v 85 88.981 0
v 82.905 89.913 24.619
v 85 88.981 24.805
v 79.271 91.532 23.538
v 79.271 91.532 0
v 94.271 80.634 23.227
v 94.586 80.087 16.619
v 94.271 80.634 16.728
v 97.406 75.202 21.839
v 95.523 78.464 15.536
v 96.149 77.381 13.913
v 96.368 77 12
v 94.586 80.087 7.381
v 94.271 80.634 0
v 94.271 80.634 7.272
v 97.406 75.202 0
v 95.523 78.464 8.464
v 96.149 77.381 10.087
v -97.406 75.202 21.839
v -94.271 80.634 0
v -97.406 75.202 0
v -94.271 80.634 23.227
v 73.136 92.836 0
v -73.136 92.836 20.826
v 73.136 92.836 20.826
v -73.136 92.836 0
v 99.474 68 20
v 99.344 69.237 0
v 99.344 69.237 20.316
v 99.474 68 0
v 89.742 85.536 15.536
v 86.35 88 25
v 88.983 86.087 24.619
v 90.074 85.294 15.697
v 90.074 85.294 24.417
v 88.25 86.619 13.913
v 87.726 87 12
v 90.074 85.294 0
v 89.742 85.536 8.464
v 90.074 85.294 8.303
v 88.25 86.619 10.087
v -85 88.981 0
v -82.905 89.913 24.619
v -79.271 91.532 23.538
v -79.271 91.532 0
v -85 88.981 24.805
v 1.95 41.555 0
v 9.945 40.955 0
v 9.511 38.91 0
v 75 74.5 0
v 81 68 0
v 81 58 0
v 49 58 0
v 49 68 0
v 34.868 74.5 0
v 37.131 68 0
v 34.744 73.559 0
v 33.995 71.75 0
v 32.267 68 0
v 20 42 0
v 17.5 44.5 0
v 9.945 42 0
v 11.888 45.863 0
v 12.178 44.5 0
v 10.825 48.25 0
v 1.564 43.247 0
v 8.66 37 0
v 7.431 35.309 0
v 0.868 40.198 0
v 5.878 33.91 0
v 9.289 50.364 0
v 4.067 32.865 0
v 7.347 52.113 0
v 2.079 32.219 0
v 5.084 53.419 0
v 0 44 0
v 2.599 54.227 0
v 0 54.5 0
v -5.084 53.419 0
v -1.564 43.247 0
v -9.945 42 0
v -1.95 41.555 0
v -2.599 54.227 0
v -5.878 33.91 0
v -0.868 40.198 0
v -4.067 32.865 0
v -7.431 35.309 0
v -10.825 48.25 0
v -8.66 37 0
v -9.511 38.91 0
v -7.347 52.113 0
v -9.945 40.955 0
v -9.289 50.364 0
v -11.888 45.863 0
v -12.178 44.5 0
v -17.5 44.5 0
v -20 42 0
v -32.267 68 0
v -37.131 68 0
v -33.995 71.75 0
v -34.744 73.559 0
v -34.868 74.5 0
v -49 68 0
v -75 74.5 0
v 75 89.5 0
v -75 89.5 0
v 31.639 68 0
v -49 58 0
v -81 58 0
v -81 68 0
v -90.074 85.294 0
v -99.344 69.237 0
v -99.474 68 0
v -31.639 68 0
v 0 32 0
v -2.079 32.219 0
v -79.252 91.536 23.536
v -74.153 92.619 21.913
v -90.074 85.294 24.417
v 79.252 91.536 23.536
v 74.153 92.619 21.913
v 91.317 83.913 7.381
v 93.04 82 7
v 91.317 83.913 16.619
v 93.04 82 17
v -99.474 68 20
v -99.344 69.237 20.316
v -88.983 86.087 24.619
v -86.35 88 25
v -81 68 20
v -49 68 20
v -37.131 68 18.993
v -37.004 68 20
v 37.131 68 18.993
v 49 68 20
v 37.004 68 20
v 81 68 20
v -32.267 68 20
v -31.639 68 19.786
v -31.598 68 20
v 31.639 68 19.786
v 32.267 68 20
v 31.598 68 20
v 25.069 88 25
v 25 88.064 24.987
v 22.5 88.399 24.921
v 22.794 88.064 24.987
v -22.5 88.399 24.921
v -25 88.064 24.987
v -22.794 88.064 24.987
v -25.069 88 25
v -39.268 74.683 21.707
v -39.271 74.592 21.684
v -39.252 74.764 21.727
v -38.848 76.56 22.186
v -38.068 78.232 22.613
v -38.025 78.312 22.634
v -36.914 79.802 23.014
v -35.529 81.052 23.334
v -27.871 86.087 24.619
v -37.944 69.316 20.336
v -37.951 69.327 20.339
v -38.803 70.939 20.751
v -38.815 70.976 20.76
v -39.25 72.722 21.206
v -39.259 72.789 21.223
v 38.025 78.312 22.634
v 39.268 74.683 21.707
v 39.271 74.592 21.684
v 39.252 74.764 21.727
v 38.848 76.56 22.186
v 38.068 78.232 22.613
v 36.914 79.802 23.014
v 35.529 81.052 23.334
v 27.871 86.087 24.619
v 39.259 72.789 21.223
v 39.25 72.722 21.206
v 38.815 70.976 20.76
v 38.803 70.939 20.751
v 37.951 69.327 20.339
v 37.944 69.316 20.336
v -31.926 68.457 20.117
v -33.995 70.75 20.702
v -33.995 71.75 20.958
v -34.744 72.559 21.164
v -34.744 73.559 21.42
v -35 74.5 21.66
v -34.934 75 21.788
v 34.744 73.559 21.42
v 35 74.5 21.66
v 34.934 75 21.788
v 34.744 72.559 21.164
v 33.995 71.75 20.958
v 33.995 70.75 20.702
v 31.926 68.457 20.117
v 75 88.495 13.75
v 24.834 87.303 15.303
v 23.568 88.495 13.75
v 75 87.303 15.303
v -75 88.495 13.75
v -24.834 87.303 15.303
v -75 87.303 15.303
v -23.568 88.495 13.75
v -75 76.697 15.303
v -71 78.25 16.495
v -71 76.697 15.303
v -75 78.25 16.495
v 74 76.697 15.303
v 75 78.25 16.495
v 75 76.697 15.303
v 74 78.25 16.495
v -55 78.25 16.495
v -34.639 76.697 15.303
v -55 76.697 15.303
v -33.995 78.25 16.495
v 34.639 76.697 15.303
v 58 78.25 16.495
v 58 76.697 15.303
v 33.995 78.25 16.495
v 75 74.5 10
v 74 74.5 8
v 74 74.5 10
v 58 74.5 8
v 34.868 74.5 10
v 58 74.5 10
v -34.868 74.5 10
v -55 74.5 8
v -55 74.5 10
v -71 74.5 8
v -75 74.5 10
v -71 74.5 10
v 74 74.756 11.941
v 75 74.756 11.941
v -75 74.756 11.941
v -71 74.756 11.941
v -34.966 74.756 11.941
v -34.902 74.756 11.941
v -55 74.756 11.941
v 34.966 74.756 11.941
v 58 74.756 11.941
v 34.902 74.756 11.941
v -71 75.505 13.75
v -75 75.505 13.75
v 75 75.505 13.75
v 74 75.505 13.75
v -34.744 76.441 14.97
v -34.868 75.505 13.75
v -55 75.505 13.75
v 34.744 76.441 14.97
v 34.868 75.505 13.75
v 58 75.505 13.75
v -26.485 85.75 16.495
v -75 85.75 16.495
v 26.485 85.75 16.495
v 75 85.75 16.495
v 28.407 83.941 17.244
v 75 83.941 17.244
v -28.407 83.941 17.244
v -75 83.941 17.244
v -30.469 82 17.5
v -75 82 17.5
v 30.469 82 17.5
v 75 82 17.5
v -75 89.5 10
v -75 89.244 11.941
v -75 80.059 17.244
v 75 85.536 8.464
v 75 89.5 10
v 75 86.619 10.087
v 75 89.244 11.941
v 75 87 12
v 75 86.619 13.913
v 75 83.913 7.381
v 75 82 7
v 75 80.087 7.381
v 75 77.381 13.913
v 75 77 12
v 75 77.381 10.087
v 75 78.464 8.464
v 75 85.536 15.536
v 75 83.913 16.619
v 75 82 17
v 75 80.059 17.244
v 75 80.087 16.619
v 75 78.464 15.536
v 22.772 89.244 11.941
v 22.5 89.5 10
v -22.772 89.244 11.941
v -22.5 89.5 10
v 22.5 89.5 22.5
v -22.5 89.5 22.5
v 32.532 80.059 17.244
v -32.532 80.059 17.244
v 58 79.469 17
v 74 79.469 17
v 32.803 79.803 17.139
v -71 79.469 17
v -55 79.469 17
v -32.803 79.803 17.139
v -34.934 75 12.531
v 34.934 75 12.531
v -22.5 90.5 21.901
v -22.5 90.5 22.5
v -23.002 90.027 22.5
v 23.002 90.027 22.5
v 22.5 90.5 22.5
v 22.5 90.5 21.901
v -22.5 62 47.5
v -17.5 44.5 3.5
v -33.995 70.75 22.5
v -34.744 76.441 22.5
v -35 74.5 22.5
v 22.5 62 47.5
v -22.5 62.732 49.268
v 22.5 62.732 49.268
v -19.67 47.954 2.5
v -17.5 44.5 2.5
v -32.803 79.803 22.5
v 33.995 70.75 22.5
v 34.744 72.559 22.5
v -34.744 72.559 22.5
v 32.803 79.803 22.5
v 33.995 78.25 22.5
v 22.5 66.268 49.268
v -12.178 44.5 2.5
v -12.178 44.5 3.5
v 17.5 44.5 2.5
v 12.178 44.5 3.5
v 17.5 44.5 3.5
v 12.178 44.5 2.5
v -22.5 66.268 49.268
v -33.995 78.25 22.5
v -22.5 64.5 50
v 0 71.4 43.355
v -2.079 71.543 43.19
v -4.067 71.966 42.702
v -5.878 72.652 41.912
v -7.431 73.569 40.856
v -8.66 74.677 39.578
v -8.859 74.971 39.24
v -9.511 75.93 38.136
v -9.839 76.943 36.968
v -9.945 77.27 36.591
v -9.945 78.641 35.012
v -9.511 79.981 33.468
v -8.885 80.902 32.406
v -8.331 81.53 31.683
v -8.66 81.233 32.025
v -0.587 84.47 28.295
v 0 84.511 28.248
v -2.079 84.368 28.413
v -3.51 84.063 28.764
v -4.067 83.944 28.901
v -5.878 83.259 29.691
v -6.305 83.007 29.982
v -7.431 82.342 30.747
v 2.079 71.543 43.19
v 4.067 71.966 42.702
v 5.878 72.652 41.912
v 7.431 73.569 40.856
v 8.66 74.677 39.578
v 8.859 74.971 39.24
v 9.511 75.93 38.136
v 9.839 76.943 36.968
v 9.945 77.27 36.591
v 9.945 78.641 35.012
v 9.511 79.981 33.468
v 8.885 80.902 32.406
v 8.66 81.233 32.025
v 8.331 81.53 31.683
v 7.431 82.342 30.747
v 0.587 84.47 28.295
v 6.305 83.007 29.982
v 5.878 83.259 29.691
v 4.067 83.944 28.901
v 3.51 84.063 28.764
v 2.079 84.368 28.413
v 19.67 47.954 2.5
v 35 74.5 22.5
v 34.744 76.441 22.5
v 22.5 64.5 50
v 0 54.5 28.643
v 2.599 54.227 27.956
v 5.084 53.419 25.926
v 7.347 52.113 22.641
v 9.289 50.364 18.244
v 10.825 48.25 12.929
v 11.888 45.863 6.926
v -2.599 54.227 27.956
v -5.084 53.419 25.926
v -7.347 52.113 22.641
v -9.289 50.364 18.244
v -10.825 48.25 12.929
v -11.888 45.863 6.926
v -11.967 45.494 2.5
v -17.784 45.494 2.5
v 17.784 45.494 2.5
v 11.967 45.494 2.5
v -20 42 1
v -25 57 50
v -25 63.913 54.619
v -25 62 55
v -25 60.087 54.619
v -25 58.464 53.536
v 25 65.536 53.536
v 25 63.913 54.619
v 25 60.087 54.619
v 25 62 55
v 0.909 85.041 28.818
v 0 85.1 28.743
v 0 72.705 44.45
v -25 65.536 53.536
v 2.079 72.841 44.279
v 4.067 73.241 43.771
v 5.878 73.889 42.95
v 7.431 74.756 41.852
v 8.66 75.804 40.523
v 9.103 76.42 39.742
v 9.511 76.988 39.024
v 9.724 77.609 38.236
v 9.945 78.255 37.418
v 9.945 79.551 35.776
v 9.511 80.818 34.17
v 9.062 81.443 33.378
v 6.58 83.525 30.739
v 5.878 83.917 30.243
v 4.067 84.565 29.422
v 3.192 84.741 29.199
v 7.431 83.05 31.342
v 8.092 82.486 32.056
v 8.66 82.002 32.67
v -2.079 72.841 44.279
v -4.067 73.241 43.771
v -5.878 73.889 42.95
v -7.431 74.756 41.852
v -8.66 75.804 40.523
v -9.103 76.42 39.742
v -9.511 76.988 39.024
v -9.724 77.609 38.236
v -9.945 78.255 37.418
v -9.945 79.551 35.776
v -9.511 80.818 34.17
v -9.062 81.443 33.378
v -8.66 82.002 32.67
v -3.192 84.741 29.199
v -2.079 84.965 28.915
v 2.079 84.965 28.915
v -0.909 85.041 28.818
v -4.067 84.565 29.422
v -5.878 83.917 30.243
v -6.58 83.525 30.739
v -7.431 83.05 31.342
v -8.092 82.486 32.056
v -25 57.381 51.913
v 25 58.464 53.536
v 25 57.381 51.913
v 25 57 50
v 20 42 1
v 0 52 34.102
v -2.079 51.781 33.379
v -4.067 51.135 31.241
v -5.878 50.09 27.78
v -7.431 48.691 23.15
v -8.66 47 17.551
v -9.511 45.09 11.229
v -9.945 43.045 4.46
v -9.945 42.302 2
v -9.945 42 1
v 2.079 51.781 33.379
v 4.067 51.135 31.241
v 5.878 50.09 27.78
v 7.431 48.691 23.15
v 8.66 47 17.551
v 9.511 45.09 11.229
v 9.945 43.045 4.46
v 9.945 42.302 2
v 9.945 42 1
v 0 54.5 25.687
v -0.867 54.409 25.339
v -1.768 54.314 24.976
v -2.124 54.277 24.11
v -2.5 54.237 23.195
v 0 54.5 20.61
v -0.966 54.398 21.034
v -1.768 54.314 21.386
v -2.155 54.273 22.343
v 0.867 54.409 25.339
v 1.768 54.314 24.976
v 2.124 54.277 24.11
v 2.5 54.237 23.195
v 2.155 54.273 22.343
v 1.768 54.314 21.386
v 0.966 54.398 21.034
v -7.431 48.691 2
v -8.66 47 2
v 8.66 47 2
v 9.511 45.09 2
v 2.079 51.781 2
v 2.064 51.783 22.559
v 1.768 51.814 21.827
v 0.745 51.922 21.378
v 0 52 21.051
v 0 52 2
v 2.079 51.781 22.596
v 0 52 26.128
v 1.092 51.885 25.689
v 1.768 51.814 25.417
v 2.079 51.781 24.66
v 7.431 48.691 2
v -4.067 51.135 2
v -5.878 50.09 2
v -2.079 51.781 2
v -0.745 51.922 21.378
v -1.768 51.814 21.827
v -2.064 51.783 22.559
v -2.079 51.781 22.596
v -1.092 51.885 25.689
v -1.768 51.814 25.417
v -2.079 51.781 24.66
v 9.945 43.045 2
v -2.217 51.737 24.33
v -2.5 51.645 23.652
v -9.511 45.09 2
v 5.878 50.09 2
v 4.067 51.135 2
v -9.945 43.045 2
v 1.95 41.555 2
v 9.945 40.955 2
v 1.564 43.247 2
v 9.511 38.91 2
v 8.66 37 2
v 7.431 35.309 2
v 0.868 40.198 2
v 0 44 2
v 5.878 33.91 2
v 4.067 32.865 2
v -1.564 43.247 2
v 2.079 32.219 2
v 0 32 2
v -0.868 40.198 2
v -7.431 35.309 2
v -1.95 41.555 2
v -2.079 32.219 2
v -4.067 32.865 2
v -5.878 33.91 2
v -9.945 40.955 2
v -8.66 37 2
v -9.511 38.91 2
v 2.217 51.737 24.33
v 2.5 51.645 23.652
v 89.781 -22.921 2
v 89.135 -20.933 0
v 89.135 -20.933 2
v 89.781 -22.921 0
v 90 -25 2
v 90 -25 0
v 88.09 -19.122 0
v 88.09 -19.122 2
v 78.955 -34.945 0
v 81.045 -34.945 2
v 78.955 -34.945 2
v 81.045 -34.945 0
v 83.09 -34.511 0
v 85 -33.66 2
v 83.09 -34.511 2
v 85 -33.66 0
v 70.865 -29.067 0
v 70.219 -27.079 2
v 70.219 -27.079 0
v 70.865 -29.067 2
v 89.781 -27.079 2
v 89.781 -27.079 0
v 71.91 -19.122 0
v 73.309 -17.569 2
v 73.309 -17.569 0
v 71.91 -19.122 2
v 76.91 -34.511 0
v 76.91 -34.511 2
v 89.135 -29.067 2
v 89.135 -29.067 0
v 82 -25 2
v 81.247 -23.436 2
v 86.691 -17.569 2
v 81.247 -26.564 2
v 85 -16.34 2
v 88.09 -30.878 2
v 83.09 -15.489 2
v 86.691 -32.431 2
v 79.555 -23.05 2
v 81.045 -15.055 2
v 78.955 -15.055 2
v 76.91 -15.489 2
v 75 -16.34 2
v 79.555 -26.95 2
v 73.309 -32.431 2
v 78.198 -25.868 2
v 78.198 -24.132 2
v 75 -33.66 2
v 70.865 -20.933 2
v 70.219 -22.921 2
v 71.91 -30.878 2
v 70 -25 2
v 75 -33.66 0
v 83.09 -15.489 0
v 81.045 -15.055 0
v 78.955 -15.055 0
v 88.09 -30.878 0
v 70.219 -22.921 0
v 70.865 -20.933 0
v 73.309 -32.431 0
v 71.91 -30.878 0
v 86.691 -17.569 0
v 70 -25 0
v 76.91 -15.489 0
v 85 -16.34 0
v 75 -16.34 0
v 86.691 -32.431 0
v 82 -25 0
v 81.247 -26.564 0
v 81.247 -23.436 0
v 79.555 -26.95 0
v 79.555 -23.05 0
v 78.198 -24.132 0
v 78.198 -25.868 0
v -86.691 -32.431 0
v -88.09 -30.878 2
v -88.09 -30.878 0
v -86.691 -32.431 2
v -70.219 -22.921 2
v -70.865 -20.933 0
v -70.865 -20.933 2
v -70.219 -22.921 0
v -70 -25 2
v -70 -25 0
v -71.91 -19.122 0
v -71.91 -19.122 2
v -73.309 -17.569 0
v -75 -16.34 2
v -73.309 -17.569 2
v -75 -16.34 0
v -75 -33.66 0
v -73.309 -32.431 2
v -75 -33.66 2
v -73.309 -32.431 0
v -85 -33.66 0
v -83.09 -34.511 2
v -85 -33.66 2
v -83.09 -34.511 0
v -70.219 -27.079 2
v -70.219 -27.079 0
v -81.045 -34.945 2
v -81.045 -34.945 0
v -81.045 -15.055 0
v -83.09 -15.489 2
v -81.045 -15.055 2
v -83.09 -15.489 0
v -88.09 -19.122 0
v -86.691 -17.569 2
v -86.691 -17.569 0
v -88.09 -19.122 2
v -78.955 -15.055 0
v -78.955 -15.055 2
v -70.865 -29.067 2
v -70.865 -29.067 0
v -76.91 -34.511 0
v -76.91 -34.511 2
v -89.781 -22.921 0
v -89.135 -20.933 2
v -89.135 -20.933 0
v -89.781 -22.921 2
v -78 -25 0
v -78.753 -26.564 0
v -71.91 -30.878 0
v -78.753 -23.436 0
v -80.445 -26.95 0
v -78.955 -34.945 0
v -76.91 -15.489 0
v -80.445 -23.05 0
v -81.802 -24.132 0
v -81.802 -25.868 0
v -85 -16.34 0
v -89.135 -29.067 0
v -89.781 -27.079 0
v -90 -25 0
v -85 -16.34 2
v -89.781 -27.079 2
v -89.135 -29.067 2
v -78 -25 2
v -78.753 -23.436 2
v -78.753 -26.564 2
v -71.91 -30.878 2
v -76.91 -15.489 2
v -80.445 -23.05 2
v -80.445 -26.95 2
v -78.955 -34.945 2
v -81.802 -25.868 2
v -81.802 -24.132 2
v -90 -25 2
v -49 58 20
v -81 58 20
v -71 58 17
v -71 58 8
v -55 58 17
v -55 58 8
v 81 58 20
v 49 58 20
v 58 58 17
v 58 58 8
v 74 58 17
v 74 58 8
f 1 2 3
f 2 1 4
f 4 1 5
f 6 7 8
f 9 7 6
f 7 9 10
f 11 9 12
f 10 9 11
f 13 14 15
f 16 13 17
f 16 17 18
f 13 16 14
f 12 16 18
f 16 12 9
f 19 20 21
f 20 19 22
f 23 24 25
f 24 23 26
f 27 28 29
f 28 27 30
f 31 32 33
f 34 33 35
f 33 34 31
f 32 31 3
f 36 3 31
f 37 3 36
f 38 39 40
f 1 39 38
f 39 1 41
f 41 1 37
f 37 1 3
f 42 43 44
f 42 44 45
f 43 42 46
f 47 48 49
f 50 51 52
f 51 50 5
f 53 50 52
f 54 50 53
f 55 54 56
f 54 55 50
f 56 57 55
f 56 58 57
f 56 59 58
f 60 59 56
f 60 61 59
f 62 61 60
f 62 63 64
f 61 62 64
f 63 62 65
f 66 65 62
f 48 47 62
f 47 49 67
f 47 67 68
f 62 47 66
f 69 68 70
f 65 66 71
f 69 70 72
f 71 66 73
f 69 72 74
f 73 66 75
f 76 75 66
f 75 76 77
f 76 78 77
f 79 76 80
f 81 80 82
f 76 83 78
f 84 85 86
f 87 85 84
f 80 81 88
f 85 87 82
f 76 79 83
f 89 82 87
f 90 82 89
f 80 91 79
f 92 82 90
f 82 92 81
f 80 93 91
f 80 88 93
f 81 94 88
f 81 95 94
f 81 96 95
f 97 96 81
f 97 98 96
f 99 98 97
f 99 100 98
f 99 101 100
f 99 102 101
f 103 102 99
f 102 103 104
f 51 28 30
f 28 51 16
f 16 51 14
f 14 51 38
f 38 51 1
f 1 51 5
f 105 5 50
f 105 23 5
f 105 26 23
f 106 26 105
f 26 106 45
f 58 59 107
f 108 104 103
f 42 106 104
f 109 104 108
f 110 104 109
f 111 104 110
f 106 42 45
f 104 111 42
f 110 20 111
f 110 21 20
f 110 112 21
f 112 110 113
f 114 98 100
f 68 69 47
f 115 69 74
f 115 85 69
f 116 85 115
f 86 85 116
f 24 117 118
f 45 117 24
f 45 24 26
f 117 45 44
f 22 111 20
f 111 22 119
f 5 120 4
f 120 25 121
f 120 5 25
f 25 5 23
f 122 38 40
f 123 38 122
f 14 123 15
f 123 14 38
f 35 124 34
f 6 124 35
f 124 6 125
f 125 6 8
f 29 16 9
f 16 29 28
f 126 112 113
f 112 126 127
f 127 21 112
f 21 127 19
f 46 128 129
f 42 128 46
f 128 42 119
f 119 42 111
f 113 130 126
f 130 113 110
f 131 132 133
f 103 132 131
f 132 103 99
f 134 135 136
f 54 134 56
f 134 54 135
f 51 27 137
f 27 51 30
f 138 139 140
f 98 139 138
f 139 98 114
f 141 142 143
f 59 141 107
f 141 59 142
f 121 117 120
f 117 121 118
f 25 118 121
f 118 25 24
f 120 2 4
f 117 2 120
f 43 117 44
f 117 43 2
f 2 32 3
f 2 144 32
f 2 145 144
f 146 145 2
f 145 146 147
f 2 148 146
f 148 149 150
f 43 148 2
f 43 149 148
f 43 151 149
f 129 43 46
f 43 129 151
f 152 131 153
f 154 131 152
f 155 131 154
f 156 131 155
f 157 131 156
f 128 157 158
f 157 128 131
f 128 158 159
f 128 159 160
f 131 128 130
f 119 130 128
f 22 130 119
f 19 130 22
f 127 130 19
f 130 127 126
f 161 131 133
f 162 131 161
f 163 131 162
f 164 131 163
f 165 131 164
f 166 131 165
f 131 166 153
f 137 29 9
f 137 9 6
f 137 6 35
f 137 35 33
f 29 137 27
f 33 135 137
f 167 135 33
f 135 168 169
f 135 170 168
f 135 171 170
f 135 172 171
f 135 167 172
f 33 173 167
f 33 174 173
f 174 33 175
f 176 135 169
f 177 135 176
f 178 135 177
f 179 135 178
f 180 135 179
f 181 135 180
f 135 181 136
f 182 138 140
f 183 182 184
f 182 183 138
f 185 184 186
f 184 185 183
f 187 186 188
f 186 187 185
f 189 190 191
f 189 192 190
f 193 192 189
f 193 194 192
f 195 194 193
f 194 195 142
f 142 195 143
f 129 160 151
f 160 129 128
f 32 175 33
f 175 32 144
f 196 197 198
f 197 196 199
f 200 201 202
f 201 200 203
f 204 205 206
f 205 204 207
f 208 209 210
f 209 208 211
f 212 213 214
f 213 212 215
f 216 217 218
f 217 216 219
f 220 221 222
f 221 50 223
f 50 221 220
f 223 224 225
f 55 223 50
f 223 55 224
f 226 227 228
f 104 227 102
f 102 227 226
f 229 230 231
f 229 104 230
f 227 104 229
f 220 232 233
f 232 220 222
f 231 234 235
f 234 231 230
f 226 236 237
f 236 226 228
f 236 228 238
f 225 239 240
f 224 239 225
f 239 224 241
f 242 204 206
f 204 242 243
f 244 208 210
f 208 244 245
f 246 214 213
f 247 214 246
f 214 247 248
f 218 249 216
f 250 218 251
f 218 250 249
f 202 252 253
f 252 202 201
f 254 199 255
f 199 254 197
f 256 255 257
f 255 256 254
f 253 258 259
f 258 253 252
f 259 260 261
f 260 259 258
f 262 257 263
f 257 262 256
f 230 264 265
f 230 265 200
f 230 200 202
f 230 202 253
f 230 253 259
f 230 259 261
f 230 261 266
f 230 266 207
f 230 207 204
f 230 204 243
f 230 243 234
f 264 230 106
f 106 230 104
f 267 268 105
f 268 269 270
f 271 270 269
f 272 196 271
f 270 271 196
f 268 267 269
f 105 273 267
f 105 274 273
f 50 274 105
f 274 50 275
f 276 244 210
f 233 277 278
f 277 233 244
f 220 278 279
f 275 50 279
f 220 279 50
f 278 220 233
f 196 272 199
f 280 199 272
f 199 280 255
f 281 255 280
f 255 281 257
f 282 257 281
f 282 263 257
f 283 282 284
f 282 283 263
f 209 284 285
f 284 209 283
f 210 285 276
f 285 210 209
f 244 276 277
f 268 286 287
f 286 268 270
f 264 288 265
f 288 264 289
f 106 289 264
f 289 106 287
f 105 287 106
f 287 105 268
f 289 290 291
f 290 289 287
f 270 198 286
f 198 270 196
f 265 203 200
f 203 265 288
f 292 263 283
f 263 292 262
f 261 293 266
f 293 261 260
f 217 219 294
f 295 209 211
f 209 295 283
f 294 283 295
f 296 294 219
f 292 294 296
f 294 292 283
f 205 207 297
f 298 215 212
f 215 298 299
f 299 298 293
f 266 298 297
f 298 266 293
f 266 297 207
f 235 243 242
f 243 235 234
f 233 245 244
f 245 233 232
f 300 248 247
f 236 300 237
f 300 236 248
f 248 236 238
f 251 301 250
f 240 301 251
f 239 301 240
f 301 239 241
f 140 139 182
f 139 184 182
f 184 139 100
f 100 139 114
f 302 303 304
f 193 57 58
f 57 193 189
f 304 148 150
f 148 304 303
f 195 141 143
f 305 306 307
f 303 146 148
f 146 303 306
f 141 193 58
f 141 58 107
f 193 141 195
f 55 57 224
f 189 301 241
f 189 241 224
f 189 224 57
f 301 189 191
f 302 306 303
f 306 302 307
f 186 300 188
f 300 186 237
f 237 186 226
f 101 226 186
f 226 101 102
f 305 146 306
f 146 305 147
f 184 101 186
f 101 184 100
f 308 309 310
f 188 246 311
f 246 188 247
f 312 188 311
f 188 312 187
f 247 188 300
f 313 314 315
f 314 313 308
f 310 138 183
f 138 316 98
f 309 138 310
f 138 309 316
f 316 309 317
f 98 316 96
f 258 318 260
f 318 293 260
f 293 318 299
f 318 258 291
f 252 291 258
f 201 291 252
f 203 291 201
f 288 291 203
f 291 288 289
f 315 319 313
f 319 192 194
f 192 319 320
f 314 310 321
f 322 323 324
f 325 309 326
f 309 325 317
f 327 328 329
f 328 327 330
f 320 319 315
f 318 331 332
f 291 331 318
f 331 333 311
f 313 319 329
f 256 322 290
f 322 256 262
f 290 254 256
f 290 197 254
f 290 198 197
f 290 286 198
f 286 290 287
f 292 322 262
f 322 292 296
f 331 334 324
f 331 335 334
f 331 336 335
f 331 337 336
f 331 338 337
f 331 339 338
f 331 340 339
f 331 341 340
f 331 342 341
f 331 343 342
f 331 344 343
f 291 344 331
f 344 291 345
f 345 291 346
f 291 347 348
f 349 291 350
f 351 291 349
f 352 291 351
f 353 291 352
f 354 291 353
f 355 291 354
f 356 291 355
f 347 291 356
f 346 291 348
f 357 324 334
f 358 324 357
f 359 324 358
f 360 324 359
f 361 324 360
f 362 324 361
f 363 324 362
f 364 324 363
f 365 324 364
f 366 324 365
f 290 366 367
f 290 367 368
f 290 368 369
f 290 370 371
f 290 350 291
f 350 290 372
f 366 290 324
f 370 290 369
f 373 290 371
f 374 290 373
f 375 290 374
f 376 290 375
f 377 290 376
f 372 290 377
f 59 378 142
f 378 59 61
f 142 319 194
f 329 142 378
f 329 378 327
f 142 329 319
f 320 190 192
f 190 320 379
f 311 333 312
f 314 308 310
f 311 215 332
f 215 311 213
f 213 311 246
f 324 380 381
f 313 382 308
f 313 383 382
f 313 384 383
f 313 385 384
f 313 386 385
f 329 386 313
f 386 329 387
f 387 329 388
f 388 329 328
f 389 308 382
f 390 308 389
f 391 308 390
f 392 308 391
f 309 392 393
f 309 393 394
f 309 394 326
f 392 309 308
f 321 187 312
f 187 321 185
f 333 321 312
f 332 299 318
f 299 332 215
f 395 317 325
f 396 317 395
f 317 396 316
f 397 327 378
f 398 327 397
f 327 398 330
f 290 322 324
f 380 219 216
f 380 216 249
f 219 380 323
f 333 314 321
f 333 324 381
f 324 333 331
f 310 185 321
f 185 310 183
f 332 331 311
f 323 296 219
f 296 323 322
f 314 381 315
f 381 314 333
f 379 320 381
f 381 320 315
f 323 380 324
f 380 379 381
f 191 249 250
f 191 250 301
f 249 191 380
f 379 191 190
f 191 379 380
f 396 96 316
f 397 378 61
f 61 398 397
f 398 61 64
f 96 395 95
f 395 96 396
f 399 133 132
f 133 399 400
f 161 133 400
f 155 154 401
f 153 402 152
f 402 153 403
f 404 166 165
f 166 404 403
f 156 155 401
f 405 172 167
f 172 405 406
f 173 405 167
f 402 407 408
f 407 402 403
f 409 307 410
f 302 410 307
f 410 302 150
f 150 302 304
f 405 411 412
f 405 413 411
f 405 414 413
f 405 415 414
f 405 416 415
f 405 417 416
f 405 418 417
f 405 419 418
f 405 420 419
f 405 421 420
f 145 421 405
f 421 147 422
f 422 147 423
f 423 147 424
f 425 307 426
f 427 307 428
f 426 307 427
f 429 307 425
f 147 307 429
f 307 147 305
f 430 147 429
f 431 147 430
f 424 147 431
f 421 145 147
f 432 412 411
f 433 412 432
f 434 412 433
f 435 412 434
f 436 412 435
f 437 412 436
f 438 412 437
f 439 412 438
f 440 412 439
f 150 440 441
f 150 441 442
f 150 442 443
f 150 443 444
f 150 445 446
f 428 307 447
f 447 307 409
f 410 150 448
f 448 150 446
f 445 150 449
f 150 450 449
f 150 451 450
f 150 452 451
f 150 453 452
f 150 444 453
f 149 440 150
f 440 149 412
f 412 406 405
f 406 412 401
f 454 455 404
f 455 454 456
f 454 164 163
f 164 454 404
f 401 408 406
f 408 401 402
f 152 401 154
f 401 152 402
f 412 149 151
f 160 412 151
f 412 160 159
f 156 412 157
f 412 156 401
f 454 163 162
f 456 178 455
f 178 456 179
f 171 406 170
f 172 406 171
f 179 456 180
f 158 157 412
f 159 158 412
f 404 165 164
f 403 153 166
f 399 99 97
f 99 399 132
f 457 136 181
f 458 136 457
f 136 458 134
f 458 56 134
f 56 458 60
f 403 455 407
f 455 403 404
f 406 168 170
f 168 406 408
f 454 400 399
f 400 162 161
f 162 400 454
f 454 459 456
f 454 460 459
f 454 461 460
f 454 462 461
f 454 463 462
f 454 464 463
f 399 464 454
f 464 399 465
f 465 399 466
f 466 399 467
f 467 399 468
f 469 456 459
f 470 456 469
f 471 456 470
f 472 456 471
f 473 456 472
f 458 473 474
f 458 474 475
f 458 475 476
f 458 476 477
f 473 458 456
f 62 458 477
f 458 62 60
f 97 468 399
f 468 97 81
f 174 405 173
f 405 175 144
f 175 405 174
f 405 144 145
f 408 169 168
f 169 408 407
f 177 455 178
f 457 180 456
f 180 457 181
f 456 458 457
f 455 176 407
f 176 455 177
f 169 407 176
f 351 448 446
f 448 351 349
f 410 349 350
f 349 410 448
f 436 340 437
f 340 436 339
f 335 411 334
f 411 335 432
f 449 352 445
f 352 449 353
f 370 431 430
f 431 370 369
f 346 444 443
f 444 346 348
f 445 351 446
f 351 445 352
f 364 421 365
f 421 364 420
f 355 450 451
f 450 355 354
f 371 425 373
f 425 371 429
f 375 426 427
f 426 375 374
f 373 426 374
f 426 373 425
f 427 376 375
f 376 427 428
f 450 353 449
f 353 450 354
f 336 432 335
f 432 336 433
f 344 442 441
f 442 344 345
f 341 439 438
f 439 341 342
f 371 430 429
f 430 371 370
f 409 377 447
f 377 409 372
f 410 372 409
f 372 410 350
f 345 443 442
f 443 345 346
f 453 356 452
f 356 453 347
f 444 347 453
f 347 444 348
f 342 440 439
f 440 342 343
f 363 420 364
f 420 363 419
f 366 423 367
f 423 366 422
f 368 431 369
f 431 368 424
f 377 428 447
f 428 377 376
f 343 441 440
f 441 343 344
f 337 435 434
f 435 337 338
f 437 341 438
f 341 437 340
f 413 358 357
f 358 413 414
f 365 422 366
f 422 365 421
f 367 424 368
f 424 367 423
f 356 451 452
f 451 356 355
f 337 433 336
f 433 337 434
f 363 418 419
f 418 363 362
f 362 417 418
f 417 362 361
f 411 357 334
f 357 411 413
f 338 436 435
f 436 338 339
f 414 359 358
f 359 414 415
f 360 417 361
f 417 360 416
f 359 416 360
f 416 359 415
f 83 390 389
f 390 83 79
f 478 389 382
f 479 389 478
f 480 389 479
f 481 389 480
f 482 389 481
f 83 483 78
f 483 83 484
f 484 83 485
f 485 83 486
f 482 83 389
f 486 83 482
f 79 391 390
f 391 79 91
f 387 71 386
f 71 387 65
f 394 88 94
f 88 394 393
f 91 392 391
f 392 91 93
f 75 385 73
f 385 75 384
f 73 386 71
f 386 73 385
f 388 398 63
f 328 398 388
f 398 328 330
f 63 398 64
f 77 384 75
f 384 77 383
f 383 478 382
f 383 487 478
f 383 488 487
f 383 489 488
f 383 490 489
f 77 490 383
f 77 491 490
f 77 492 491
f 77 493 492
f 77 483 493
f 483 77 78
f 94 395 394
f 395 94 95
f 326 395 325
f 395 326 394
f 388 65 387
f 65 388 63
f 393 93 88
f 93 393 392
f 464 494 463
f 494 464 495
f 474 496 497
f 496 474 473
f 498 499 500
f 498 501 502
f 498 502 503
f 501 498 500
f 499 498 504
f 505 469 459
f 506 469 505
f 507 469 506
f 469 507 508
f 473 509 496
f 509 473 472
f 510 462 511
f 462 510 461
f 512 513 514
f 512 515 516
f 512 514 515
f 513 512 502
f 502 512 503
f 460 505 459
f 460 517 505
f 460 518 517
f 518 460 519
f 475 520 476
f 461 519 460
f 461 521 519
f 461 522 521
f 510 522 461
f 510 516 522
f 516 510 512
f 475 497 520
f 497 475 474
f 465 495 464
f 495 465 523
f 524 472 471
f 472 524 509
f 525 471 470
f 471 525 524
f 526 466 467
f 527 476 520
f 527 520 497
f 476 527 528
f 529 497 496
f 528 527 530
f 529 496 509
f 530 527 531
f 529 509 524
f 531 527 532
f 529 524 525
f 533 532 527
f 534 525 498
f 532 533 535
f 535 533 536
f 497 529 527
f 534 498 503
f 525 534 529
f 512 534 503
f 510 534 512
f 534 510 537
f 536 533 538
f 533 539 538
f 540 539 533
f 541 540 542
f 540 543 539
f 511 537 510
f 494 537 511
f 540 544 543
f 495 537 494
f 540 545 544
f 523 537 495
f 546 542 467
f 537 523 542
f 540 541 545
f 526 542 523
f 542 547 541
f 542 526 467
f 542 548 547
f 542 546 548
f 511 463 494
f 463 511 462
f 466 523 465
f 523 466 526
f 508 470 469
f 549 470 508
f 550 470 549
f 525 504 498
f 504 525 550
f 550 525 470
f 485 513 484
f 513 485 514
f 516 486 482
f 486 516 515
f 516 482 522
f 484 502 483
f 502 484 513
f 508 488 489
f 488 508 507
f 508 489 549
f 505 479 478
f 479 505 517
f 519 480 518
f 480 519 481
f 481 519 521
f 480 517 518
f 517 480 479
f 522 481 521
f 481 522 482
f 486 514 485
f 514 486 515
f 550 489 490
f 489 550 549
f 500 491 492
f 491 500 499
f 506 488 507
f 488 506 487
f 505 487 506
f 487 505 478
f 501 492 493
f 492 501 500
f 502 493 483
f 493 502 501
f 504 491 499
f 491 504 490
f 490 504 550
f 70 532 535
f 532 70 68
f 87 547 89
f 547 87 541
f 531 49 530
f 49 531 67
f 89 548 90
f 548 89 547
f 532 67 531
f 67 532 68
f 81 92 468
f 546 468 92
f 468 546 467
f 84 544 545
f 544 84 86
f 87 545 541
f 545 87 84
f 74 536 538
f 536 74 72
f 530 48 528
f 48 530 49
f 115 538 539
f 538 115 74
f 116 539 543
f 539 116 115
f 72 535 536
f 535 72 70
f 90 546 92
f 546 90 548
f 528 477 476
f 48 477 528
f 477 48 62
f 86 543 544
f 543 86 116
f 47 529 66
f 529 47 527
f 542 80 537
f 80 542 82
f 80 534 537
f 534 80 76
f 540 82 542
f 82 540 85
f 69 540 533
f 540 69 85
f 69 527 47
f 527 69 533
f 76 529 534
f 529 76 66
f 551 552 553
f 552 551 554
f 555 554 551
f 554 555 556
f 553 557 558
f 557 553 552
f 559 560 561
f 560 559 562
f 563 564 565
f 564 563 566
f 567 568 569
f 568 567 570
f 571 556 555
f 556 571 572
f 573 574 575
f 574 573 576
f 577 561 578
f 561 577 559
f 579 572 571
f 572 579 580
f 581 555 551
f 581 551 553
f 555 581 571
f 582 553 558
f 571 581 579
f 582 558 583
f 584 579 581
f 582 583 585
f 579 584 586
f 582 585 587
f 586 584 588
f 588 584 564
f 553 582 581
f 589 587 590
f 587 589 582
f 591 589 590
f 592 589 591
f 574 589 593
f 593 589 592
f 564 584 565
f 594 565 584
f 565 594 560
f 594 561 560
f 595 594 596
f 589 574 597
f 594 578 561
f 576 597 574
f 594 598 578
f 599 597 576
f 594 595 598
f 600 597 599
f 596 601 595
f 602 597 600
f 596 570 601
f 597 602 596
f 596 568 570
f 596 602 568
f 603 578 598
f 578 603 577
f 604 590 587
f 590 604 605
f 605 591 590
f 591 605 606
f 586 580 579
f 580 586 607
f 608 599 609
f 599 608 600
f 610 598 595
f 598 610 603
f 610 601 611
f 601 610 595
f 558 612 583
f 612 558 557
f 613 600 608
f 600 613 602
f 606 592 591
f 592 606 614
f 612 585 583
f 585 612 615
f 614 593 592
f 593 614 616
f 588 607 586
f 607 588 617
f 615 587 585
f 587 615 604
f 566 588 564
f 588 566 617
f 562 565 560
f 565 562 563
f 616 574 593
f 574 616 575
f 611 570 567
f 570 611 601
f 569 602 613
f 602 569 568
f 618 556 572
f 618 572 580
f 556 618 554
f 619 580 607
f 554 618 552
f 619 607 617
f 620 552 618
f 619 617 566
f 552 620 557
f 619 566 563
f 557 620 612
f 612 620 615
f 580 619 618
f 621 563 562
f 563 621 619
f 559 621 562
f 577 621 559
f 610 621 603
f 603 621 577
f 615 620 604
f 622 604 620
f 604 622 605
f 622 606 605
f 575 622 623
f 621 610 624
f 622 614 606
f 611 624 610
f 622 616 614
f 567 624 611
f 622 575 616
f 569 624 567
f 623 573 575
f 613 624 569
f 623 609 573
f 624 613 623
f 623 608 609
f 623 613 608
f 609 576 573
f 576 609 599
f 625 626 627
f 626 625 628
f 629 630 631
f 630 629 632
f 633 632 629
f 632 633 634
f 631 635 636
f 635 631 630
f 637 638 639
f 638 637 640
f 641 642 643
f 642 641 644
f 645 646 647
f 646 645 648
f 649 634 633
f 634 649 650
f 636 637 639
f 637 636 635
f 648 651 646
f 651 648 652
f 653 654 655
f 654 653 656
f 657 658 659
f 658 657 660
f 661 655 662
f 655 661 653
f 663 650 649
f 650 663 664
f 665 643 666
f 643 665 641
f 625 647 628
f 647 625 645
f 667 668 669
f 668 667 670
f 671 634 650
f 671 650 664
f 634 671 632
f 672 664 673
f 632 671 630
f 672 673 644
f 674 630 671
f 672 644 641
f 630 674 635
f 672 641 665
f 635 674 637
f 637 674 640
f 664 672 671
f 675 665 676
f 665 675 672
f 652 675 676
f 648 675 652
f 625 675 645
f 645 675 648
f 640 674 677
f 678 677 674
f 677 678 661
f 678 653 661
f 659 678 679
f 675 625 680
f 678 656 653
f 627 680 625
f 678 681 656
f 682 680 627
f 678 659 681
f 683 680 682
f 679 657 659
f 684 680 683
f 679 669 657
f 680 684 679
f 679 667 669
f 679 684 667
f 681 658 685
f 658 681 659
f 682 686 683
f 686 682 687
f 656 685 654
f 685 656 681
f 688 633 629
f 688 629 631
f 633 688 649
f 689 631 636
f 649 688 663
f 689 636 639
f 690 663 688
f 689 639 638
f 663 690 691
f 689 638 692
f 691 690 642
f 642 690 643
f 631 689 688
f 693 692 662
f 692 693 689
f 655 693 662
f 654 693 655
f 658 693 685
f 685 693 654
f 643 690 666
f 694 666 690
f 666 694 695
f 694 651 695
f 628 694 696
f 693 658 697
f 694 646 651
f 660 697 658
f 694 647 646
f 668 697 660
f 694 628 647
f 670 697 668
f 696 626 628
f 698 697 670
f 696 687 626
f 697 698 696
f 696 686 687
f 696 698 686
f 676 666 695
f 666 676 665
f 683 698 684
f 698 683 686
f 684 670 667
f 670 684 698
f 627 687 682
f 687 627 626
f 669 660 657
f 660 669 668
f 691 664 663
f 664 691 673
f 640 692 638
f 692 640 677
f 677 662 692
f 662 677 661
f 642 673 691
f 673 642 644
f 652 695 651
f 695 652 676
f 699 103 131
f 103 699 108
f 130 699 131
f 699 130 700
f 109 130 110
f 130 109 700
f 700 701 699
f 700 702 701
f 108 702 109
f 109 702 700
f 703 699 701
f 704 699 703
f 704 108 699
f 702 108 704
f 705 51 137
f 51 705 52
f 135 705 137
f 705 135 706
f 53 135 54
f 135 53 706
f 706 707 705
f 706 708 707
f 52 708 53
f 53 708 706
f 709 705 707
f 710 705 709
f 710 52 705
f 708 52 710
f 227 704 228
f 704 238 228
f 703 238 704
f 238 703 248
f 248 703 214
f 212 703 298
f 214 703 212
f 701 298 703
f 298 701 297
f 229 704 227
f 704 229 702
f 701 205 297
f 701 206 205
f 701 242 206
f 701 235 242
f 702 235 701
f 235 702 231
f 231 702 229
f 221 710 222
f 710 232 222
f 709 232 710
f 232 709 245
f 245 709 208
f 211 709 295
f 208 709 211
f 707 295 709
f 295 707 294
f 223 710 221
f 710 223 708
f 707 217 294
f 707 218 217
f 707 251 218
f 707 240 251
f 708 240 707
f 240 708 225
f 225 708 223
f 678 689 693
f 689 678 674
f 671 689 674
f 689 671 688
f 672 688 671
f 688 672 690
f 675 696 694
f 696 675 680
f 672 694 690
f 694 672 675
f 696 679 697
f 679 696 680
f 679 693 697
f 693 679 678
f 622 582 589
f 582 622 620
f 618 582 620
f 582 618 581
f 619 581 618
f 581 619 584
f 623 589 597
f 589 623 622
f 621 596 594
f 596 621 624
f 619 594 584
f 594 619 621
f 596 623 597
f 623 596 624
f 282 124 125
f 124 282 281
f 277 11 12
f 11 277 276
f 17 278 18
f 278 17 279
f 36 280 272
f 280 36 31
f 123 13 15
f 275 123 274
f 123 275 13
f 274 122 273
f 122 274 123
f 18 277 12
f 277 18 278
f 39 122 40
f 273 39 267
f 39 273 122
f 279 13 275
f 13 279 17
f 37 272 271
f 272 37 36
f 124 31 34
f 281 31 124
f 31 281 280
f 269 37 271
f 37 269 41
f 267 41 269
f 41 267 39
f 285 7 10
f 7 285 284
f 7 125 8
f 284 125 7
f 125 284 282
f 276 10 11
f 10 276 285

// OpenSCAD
// file: power4all.scad
// SPDX: CC-BY-SA-4.0
// Copyright 2020 Brian Starkey <stark3y@gmail.com>

module power4all() {

$fn = 128;
dxf_file = "power4all.dxf";

// Arbitrary small offset used to avoid zero-thickness surfaces
e = 1;

// The intersection applies a chamfer to the top edges. Not functionally necessary.
translate([0, 0, 20]) rotate([0, 180, 0]) intersection() {
	// Main structure
	difference() {
		// Main block
		union() {
			// Main block, to subtract everything else from
			linear_extrude(height = 20) import(dxf_file, layer="main_block");
		}
		// Minus all the internals
		union() {
			// Slice out the raised section at the back
			// Extrude length isn't important, just needs to cover the whole piece
			translate([-40, 0, 0]) rotate([0, 90, 0]) linear_extrude(height = 80) import(dxf_file, layer="sub_rear_horizontal");

			// Everything cut from the underside translated down by 'e' to avoid zero-thickness
			// surfaces at the base
			// All extrusions correspondingly increased by "e"
			translate([0, 0, -e]) {
				// Space where the contacts go. "10" is measured.
				linear_extrude(height = 10 + e) import(dxf_file, layer="sub_contacts");

				// This is the gap for the spade terminals to wedge into. The slots are angled to suit
				// the geometry of my spade terminals, but I'm not sure if that's universal.
				// The slot thickness comes out about right for my spades.
				// "7" is the width of my spades + 1
				linear_extrude(height = 7 + e) import(dxf_file, layer="sub_spades");

				// Deeper than the spade slots, to match up with the connector. This would be neater if it
				// sloped downwards, but I'm lazy and it doesn't really matter.
				// "10" is just eyeballed
				linear_extrude(height = 10 + e) import(dxf_file, layer="sub_wiring");

				// Cut out the hole where the spring clip goes
				// "15" is measured as the clip protrudes ~5 mm above the top surface
				linear_extrude(height = 15 + e) import(dxf_file, layer="sub_clip");

				// Not functional, but just to remind which terminal is which
				// "11" is eyeballed
				linear_extrude(height = 11 + e) import(dxf_file, layer="sub_signs");

			}

			// For the slides, extrude one part straight up (for the profile in X, Y), then intersect with
			// a horizontal profile, to get the Z
			intersection() {
				// Height not important, just needs to be tall enough to cover the full slides
				linear_extrude(height = 16) import(dxf_file, "slides_vertical");

				// Note that the X offset in the DXF file is important for this layer, representing
				// the distance from the base to the bottom of the slides. This allows a rotation
				// around the Y axis to place the slides in the right place vertically.
				// Extrusion height is not important - just needs to be large enough to cover everything
				translate([-40, 0, 0]) rotate([0, 90, 0]) linear_extrude(height = 80) import(dxf_file, layer="slides_horizontal");
			}

			// Cut out the XT60 connector. It's slightly oversize, so that the mating connector fits easily.
			// 60 is the distance to the end face, so 60 - 17 embeds the whole connector inside
			translate([0, 60 - 17, 7]) rotate([0, 90, 90]) linear_extrude(height = 17 + e) import(dxf_file, layer="sub_xt60");
		}
	}

	// Chamfer the top edges
	//translate([0, 70, 0]) rotate([90, 0, 0]) linear_extrude(height = 100) import(dxf_file, layer="chamfer");
}
}
// main file
include <power4all.scad>

difference() {
union() {
    // battery mounts
    translate ([-65, 0, 0]) power4all();
    translate ([65, 0, 0]) power4all();
    // left/right screw mounts
    translate([80, -25, 0]) cylinder(r=10, h=2);
    translate([-80, -25, 0]) cylinder(r=10, h=2);
    // connectors to main cable channel
    translate ([-81, 58, 0]) cube([32, 10, 20]);
    translate ([49, 58, 0]) cube([32, 10, 20]);
    
    difference() {
        // main cable channel shape
        intersection() {
            topboard();
            cablerun();
        }
        // minus cable run space and switch box interior volume
        union() {
            hull() {
                translate ([-75, 82, 0]) rotate([0, 90, 0]) cylinder(r=7.5, h=150);
                translate ([-75, 82, 10]) rotate([0, 90, 0]) cylinder(r=7.5, h=150);
            };
            translate ([-22.5, 45.5, 2.5]) switchbox(45, 45, 45, 7.5, 2.5);
            translate ([-22.5, 45.5, -1]) switchbox(45, 45, 45, 7.5, 2.5);
        }
    };
    
   difference() { 
        translate ([-25, 42, 0])
        difference() {
            union() {
                difference() {
                    union() {
                        difference() {
                            // main switch box
                            switchbox(50, 50, 50);
                            // minus inteior volume
                            union() {
                                translate([2.5, 2.5, 2.5]) switchbox(45, 45, 45, 7.5, 2.5);
                                translate([2.5, 2.5, -1]) switchbox(45, 45, 45, 7.5, 2.5);
                            }
                            // minus rocker switch hole
                            translate([25, 35, 35]) rotate([0, 50, 90]) cylinder(r=10, h=5);
                            
                        }
                        // cylindrical support for center screw mount
                        intersection() {
                            switchbox(50, 50, 50);
                            translate([25, 0, 0]) rotate([0, 0, 90]) cylinder(r=12.5, h=50);
                        }
                    }
                    // minus center screw pad space
                    translate([25, 0, 2]) rotate([0, 0, 90]) cylinder(r=10, h=50);
                    // minus DC cable egress hole
                    translate([25, 2, 25]) rotate([0, 100, 90]) cylinder(r=2.5, h=20);
                }
                // center screw mount pad
                translate([25, 0, 0]) rotate([0, 0, 90]) cylinder(r=10, h=2);
            }
            // center screw hole
            translate([25, 0, -1]) rotate([0, 0, 90]) cylinder(r=2, h=4);
        }
        // take away interior cable volume again
        hull() {
            translate ([-75, 82, 0]) rotate([0, 90, 0]) cylinder(r=7.5, h=150);
            translate ([-75, 82, 10]) rotate([0, 90, 0]) cylinder(r=7.5, h=150);
        };
    }
}
// interior cable holes to left/right mounts from main channel
translate ([-71, 55, 8]) cube([16, 25, 9]);
translate ([58, 55, 8]) cube([16, 25, 9]);
// screw holes for top-left/right mounts
translate([-80, -25, -1]) cylinder(r=2, h=5);
translate([80, -25, -1]) cylinder(r=2, h=5);
// main cable egress point
translate ([70, 82, 12]) rotate([0, 90, 0]) cylinder(r=5, h=40);

}

module switchbox(width, length, height, sideradius=10, topradius=5) {
    hull() {
        translate([0, length-10, 0]) cube([width, 10, 20]);
        translate([0, 20, height]) rotate([0, 90, 0]) cylinder(r=topradius, h=width);
        translate([5, 0, 0]) cube([width-10, 5, 1]);
        translate([-5, length - (length/3), 0]) cylinder(r=sideradius, h=20);
        translate([width+5, length - (length/3), 0]) cylinder(r=sideradius, h=20);
    }   
}

module cablerun() {
        translate([100,68,20])
        rotate([-90,0,90])
        linear_extrude(height=200) {
            hull() {
                translate ([20, 0, 0]) circle(r=5);
                translate ([0, 0, 0]) square([25,20]);
            }
        }  
}

// original top board, to act as a cutout for main cable run
module topboard() {
    translate([-(100 - 30), 30 + (93 - 130), 0]) 
    linear_extrude(height=40) {
    minkowski() {
			square([200 - 2 * 30, 130 - 2 * 30]);
			circle( 30 );
		}
    };
}
